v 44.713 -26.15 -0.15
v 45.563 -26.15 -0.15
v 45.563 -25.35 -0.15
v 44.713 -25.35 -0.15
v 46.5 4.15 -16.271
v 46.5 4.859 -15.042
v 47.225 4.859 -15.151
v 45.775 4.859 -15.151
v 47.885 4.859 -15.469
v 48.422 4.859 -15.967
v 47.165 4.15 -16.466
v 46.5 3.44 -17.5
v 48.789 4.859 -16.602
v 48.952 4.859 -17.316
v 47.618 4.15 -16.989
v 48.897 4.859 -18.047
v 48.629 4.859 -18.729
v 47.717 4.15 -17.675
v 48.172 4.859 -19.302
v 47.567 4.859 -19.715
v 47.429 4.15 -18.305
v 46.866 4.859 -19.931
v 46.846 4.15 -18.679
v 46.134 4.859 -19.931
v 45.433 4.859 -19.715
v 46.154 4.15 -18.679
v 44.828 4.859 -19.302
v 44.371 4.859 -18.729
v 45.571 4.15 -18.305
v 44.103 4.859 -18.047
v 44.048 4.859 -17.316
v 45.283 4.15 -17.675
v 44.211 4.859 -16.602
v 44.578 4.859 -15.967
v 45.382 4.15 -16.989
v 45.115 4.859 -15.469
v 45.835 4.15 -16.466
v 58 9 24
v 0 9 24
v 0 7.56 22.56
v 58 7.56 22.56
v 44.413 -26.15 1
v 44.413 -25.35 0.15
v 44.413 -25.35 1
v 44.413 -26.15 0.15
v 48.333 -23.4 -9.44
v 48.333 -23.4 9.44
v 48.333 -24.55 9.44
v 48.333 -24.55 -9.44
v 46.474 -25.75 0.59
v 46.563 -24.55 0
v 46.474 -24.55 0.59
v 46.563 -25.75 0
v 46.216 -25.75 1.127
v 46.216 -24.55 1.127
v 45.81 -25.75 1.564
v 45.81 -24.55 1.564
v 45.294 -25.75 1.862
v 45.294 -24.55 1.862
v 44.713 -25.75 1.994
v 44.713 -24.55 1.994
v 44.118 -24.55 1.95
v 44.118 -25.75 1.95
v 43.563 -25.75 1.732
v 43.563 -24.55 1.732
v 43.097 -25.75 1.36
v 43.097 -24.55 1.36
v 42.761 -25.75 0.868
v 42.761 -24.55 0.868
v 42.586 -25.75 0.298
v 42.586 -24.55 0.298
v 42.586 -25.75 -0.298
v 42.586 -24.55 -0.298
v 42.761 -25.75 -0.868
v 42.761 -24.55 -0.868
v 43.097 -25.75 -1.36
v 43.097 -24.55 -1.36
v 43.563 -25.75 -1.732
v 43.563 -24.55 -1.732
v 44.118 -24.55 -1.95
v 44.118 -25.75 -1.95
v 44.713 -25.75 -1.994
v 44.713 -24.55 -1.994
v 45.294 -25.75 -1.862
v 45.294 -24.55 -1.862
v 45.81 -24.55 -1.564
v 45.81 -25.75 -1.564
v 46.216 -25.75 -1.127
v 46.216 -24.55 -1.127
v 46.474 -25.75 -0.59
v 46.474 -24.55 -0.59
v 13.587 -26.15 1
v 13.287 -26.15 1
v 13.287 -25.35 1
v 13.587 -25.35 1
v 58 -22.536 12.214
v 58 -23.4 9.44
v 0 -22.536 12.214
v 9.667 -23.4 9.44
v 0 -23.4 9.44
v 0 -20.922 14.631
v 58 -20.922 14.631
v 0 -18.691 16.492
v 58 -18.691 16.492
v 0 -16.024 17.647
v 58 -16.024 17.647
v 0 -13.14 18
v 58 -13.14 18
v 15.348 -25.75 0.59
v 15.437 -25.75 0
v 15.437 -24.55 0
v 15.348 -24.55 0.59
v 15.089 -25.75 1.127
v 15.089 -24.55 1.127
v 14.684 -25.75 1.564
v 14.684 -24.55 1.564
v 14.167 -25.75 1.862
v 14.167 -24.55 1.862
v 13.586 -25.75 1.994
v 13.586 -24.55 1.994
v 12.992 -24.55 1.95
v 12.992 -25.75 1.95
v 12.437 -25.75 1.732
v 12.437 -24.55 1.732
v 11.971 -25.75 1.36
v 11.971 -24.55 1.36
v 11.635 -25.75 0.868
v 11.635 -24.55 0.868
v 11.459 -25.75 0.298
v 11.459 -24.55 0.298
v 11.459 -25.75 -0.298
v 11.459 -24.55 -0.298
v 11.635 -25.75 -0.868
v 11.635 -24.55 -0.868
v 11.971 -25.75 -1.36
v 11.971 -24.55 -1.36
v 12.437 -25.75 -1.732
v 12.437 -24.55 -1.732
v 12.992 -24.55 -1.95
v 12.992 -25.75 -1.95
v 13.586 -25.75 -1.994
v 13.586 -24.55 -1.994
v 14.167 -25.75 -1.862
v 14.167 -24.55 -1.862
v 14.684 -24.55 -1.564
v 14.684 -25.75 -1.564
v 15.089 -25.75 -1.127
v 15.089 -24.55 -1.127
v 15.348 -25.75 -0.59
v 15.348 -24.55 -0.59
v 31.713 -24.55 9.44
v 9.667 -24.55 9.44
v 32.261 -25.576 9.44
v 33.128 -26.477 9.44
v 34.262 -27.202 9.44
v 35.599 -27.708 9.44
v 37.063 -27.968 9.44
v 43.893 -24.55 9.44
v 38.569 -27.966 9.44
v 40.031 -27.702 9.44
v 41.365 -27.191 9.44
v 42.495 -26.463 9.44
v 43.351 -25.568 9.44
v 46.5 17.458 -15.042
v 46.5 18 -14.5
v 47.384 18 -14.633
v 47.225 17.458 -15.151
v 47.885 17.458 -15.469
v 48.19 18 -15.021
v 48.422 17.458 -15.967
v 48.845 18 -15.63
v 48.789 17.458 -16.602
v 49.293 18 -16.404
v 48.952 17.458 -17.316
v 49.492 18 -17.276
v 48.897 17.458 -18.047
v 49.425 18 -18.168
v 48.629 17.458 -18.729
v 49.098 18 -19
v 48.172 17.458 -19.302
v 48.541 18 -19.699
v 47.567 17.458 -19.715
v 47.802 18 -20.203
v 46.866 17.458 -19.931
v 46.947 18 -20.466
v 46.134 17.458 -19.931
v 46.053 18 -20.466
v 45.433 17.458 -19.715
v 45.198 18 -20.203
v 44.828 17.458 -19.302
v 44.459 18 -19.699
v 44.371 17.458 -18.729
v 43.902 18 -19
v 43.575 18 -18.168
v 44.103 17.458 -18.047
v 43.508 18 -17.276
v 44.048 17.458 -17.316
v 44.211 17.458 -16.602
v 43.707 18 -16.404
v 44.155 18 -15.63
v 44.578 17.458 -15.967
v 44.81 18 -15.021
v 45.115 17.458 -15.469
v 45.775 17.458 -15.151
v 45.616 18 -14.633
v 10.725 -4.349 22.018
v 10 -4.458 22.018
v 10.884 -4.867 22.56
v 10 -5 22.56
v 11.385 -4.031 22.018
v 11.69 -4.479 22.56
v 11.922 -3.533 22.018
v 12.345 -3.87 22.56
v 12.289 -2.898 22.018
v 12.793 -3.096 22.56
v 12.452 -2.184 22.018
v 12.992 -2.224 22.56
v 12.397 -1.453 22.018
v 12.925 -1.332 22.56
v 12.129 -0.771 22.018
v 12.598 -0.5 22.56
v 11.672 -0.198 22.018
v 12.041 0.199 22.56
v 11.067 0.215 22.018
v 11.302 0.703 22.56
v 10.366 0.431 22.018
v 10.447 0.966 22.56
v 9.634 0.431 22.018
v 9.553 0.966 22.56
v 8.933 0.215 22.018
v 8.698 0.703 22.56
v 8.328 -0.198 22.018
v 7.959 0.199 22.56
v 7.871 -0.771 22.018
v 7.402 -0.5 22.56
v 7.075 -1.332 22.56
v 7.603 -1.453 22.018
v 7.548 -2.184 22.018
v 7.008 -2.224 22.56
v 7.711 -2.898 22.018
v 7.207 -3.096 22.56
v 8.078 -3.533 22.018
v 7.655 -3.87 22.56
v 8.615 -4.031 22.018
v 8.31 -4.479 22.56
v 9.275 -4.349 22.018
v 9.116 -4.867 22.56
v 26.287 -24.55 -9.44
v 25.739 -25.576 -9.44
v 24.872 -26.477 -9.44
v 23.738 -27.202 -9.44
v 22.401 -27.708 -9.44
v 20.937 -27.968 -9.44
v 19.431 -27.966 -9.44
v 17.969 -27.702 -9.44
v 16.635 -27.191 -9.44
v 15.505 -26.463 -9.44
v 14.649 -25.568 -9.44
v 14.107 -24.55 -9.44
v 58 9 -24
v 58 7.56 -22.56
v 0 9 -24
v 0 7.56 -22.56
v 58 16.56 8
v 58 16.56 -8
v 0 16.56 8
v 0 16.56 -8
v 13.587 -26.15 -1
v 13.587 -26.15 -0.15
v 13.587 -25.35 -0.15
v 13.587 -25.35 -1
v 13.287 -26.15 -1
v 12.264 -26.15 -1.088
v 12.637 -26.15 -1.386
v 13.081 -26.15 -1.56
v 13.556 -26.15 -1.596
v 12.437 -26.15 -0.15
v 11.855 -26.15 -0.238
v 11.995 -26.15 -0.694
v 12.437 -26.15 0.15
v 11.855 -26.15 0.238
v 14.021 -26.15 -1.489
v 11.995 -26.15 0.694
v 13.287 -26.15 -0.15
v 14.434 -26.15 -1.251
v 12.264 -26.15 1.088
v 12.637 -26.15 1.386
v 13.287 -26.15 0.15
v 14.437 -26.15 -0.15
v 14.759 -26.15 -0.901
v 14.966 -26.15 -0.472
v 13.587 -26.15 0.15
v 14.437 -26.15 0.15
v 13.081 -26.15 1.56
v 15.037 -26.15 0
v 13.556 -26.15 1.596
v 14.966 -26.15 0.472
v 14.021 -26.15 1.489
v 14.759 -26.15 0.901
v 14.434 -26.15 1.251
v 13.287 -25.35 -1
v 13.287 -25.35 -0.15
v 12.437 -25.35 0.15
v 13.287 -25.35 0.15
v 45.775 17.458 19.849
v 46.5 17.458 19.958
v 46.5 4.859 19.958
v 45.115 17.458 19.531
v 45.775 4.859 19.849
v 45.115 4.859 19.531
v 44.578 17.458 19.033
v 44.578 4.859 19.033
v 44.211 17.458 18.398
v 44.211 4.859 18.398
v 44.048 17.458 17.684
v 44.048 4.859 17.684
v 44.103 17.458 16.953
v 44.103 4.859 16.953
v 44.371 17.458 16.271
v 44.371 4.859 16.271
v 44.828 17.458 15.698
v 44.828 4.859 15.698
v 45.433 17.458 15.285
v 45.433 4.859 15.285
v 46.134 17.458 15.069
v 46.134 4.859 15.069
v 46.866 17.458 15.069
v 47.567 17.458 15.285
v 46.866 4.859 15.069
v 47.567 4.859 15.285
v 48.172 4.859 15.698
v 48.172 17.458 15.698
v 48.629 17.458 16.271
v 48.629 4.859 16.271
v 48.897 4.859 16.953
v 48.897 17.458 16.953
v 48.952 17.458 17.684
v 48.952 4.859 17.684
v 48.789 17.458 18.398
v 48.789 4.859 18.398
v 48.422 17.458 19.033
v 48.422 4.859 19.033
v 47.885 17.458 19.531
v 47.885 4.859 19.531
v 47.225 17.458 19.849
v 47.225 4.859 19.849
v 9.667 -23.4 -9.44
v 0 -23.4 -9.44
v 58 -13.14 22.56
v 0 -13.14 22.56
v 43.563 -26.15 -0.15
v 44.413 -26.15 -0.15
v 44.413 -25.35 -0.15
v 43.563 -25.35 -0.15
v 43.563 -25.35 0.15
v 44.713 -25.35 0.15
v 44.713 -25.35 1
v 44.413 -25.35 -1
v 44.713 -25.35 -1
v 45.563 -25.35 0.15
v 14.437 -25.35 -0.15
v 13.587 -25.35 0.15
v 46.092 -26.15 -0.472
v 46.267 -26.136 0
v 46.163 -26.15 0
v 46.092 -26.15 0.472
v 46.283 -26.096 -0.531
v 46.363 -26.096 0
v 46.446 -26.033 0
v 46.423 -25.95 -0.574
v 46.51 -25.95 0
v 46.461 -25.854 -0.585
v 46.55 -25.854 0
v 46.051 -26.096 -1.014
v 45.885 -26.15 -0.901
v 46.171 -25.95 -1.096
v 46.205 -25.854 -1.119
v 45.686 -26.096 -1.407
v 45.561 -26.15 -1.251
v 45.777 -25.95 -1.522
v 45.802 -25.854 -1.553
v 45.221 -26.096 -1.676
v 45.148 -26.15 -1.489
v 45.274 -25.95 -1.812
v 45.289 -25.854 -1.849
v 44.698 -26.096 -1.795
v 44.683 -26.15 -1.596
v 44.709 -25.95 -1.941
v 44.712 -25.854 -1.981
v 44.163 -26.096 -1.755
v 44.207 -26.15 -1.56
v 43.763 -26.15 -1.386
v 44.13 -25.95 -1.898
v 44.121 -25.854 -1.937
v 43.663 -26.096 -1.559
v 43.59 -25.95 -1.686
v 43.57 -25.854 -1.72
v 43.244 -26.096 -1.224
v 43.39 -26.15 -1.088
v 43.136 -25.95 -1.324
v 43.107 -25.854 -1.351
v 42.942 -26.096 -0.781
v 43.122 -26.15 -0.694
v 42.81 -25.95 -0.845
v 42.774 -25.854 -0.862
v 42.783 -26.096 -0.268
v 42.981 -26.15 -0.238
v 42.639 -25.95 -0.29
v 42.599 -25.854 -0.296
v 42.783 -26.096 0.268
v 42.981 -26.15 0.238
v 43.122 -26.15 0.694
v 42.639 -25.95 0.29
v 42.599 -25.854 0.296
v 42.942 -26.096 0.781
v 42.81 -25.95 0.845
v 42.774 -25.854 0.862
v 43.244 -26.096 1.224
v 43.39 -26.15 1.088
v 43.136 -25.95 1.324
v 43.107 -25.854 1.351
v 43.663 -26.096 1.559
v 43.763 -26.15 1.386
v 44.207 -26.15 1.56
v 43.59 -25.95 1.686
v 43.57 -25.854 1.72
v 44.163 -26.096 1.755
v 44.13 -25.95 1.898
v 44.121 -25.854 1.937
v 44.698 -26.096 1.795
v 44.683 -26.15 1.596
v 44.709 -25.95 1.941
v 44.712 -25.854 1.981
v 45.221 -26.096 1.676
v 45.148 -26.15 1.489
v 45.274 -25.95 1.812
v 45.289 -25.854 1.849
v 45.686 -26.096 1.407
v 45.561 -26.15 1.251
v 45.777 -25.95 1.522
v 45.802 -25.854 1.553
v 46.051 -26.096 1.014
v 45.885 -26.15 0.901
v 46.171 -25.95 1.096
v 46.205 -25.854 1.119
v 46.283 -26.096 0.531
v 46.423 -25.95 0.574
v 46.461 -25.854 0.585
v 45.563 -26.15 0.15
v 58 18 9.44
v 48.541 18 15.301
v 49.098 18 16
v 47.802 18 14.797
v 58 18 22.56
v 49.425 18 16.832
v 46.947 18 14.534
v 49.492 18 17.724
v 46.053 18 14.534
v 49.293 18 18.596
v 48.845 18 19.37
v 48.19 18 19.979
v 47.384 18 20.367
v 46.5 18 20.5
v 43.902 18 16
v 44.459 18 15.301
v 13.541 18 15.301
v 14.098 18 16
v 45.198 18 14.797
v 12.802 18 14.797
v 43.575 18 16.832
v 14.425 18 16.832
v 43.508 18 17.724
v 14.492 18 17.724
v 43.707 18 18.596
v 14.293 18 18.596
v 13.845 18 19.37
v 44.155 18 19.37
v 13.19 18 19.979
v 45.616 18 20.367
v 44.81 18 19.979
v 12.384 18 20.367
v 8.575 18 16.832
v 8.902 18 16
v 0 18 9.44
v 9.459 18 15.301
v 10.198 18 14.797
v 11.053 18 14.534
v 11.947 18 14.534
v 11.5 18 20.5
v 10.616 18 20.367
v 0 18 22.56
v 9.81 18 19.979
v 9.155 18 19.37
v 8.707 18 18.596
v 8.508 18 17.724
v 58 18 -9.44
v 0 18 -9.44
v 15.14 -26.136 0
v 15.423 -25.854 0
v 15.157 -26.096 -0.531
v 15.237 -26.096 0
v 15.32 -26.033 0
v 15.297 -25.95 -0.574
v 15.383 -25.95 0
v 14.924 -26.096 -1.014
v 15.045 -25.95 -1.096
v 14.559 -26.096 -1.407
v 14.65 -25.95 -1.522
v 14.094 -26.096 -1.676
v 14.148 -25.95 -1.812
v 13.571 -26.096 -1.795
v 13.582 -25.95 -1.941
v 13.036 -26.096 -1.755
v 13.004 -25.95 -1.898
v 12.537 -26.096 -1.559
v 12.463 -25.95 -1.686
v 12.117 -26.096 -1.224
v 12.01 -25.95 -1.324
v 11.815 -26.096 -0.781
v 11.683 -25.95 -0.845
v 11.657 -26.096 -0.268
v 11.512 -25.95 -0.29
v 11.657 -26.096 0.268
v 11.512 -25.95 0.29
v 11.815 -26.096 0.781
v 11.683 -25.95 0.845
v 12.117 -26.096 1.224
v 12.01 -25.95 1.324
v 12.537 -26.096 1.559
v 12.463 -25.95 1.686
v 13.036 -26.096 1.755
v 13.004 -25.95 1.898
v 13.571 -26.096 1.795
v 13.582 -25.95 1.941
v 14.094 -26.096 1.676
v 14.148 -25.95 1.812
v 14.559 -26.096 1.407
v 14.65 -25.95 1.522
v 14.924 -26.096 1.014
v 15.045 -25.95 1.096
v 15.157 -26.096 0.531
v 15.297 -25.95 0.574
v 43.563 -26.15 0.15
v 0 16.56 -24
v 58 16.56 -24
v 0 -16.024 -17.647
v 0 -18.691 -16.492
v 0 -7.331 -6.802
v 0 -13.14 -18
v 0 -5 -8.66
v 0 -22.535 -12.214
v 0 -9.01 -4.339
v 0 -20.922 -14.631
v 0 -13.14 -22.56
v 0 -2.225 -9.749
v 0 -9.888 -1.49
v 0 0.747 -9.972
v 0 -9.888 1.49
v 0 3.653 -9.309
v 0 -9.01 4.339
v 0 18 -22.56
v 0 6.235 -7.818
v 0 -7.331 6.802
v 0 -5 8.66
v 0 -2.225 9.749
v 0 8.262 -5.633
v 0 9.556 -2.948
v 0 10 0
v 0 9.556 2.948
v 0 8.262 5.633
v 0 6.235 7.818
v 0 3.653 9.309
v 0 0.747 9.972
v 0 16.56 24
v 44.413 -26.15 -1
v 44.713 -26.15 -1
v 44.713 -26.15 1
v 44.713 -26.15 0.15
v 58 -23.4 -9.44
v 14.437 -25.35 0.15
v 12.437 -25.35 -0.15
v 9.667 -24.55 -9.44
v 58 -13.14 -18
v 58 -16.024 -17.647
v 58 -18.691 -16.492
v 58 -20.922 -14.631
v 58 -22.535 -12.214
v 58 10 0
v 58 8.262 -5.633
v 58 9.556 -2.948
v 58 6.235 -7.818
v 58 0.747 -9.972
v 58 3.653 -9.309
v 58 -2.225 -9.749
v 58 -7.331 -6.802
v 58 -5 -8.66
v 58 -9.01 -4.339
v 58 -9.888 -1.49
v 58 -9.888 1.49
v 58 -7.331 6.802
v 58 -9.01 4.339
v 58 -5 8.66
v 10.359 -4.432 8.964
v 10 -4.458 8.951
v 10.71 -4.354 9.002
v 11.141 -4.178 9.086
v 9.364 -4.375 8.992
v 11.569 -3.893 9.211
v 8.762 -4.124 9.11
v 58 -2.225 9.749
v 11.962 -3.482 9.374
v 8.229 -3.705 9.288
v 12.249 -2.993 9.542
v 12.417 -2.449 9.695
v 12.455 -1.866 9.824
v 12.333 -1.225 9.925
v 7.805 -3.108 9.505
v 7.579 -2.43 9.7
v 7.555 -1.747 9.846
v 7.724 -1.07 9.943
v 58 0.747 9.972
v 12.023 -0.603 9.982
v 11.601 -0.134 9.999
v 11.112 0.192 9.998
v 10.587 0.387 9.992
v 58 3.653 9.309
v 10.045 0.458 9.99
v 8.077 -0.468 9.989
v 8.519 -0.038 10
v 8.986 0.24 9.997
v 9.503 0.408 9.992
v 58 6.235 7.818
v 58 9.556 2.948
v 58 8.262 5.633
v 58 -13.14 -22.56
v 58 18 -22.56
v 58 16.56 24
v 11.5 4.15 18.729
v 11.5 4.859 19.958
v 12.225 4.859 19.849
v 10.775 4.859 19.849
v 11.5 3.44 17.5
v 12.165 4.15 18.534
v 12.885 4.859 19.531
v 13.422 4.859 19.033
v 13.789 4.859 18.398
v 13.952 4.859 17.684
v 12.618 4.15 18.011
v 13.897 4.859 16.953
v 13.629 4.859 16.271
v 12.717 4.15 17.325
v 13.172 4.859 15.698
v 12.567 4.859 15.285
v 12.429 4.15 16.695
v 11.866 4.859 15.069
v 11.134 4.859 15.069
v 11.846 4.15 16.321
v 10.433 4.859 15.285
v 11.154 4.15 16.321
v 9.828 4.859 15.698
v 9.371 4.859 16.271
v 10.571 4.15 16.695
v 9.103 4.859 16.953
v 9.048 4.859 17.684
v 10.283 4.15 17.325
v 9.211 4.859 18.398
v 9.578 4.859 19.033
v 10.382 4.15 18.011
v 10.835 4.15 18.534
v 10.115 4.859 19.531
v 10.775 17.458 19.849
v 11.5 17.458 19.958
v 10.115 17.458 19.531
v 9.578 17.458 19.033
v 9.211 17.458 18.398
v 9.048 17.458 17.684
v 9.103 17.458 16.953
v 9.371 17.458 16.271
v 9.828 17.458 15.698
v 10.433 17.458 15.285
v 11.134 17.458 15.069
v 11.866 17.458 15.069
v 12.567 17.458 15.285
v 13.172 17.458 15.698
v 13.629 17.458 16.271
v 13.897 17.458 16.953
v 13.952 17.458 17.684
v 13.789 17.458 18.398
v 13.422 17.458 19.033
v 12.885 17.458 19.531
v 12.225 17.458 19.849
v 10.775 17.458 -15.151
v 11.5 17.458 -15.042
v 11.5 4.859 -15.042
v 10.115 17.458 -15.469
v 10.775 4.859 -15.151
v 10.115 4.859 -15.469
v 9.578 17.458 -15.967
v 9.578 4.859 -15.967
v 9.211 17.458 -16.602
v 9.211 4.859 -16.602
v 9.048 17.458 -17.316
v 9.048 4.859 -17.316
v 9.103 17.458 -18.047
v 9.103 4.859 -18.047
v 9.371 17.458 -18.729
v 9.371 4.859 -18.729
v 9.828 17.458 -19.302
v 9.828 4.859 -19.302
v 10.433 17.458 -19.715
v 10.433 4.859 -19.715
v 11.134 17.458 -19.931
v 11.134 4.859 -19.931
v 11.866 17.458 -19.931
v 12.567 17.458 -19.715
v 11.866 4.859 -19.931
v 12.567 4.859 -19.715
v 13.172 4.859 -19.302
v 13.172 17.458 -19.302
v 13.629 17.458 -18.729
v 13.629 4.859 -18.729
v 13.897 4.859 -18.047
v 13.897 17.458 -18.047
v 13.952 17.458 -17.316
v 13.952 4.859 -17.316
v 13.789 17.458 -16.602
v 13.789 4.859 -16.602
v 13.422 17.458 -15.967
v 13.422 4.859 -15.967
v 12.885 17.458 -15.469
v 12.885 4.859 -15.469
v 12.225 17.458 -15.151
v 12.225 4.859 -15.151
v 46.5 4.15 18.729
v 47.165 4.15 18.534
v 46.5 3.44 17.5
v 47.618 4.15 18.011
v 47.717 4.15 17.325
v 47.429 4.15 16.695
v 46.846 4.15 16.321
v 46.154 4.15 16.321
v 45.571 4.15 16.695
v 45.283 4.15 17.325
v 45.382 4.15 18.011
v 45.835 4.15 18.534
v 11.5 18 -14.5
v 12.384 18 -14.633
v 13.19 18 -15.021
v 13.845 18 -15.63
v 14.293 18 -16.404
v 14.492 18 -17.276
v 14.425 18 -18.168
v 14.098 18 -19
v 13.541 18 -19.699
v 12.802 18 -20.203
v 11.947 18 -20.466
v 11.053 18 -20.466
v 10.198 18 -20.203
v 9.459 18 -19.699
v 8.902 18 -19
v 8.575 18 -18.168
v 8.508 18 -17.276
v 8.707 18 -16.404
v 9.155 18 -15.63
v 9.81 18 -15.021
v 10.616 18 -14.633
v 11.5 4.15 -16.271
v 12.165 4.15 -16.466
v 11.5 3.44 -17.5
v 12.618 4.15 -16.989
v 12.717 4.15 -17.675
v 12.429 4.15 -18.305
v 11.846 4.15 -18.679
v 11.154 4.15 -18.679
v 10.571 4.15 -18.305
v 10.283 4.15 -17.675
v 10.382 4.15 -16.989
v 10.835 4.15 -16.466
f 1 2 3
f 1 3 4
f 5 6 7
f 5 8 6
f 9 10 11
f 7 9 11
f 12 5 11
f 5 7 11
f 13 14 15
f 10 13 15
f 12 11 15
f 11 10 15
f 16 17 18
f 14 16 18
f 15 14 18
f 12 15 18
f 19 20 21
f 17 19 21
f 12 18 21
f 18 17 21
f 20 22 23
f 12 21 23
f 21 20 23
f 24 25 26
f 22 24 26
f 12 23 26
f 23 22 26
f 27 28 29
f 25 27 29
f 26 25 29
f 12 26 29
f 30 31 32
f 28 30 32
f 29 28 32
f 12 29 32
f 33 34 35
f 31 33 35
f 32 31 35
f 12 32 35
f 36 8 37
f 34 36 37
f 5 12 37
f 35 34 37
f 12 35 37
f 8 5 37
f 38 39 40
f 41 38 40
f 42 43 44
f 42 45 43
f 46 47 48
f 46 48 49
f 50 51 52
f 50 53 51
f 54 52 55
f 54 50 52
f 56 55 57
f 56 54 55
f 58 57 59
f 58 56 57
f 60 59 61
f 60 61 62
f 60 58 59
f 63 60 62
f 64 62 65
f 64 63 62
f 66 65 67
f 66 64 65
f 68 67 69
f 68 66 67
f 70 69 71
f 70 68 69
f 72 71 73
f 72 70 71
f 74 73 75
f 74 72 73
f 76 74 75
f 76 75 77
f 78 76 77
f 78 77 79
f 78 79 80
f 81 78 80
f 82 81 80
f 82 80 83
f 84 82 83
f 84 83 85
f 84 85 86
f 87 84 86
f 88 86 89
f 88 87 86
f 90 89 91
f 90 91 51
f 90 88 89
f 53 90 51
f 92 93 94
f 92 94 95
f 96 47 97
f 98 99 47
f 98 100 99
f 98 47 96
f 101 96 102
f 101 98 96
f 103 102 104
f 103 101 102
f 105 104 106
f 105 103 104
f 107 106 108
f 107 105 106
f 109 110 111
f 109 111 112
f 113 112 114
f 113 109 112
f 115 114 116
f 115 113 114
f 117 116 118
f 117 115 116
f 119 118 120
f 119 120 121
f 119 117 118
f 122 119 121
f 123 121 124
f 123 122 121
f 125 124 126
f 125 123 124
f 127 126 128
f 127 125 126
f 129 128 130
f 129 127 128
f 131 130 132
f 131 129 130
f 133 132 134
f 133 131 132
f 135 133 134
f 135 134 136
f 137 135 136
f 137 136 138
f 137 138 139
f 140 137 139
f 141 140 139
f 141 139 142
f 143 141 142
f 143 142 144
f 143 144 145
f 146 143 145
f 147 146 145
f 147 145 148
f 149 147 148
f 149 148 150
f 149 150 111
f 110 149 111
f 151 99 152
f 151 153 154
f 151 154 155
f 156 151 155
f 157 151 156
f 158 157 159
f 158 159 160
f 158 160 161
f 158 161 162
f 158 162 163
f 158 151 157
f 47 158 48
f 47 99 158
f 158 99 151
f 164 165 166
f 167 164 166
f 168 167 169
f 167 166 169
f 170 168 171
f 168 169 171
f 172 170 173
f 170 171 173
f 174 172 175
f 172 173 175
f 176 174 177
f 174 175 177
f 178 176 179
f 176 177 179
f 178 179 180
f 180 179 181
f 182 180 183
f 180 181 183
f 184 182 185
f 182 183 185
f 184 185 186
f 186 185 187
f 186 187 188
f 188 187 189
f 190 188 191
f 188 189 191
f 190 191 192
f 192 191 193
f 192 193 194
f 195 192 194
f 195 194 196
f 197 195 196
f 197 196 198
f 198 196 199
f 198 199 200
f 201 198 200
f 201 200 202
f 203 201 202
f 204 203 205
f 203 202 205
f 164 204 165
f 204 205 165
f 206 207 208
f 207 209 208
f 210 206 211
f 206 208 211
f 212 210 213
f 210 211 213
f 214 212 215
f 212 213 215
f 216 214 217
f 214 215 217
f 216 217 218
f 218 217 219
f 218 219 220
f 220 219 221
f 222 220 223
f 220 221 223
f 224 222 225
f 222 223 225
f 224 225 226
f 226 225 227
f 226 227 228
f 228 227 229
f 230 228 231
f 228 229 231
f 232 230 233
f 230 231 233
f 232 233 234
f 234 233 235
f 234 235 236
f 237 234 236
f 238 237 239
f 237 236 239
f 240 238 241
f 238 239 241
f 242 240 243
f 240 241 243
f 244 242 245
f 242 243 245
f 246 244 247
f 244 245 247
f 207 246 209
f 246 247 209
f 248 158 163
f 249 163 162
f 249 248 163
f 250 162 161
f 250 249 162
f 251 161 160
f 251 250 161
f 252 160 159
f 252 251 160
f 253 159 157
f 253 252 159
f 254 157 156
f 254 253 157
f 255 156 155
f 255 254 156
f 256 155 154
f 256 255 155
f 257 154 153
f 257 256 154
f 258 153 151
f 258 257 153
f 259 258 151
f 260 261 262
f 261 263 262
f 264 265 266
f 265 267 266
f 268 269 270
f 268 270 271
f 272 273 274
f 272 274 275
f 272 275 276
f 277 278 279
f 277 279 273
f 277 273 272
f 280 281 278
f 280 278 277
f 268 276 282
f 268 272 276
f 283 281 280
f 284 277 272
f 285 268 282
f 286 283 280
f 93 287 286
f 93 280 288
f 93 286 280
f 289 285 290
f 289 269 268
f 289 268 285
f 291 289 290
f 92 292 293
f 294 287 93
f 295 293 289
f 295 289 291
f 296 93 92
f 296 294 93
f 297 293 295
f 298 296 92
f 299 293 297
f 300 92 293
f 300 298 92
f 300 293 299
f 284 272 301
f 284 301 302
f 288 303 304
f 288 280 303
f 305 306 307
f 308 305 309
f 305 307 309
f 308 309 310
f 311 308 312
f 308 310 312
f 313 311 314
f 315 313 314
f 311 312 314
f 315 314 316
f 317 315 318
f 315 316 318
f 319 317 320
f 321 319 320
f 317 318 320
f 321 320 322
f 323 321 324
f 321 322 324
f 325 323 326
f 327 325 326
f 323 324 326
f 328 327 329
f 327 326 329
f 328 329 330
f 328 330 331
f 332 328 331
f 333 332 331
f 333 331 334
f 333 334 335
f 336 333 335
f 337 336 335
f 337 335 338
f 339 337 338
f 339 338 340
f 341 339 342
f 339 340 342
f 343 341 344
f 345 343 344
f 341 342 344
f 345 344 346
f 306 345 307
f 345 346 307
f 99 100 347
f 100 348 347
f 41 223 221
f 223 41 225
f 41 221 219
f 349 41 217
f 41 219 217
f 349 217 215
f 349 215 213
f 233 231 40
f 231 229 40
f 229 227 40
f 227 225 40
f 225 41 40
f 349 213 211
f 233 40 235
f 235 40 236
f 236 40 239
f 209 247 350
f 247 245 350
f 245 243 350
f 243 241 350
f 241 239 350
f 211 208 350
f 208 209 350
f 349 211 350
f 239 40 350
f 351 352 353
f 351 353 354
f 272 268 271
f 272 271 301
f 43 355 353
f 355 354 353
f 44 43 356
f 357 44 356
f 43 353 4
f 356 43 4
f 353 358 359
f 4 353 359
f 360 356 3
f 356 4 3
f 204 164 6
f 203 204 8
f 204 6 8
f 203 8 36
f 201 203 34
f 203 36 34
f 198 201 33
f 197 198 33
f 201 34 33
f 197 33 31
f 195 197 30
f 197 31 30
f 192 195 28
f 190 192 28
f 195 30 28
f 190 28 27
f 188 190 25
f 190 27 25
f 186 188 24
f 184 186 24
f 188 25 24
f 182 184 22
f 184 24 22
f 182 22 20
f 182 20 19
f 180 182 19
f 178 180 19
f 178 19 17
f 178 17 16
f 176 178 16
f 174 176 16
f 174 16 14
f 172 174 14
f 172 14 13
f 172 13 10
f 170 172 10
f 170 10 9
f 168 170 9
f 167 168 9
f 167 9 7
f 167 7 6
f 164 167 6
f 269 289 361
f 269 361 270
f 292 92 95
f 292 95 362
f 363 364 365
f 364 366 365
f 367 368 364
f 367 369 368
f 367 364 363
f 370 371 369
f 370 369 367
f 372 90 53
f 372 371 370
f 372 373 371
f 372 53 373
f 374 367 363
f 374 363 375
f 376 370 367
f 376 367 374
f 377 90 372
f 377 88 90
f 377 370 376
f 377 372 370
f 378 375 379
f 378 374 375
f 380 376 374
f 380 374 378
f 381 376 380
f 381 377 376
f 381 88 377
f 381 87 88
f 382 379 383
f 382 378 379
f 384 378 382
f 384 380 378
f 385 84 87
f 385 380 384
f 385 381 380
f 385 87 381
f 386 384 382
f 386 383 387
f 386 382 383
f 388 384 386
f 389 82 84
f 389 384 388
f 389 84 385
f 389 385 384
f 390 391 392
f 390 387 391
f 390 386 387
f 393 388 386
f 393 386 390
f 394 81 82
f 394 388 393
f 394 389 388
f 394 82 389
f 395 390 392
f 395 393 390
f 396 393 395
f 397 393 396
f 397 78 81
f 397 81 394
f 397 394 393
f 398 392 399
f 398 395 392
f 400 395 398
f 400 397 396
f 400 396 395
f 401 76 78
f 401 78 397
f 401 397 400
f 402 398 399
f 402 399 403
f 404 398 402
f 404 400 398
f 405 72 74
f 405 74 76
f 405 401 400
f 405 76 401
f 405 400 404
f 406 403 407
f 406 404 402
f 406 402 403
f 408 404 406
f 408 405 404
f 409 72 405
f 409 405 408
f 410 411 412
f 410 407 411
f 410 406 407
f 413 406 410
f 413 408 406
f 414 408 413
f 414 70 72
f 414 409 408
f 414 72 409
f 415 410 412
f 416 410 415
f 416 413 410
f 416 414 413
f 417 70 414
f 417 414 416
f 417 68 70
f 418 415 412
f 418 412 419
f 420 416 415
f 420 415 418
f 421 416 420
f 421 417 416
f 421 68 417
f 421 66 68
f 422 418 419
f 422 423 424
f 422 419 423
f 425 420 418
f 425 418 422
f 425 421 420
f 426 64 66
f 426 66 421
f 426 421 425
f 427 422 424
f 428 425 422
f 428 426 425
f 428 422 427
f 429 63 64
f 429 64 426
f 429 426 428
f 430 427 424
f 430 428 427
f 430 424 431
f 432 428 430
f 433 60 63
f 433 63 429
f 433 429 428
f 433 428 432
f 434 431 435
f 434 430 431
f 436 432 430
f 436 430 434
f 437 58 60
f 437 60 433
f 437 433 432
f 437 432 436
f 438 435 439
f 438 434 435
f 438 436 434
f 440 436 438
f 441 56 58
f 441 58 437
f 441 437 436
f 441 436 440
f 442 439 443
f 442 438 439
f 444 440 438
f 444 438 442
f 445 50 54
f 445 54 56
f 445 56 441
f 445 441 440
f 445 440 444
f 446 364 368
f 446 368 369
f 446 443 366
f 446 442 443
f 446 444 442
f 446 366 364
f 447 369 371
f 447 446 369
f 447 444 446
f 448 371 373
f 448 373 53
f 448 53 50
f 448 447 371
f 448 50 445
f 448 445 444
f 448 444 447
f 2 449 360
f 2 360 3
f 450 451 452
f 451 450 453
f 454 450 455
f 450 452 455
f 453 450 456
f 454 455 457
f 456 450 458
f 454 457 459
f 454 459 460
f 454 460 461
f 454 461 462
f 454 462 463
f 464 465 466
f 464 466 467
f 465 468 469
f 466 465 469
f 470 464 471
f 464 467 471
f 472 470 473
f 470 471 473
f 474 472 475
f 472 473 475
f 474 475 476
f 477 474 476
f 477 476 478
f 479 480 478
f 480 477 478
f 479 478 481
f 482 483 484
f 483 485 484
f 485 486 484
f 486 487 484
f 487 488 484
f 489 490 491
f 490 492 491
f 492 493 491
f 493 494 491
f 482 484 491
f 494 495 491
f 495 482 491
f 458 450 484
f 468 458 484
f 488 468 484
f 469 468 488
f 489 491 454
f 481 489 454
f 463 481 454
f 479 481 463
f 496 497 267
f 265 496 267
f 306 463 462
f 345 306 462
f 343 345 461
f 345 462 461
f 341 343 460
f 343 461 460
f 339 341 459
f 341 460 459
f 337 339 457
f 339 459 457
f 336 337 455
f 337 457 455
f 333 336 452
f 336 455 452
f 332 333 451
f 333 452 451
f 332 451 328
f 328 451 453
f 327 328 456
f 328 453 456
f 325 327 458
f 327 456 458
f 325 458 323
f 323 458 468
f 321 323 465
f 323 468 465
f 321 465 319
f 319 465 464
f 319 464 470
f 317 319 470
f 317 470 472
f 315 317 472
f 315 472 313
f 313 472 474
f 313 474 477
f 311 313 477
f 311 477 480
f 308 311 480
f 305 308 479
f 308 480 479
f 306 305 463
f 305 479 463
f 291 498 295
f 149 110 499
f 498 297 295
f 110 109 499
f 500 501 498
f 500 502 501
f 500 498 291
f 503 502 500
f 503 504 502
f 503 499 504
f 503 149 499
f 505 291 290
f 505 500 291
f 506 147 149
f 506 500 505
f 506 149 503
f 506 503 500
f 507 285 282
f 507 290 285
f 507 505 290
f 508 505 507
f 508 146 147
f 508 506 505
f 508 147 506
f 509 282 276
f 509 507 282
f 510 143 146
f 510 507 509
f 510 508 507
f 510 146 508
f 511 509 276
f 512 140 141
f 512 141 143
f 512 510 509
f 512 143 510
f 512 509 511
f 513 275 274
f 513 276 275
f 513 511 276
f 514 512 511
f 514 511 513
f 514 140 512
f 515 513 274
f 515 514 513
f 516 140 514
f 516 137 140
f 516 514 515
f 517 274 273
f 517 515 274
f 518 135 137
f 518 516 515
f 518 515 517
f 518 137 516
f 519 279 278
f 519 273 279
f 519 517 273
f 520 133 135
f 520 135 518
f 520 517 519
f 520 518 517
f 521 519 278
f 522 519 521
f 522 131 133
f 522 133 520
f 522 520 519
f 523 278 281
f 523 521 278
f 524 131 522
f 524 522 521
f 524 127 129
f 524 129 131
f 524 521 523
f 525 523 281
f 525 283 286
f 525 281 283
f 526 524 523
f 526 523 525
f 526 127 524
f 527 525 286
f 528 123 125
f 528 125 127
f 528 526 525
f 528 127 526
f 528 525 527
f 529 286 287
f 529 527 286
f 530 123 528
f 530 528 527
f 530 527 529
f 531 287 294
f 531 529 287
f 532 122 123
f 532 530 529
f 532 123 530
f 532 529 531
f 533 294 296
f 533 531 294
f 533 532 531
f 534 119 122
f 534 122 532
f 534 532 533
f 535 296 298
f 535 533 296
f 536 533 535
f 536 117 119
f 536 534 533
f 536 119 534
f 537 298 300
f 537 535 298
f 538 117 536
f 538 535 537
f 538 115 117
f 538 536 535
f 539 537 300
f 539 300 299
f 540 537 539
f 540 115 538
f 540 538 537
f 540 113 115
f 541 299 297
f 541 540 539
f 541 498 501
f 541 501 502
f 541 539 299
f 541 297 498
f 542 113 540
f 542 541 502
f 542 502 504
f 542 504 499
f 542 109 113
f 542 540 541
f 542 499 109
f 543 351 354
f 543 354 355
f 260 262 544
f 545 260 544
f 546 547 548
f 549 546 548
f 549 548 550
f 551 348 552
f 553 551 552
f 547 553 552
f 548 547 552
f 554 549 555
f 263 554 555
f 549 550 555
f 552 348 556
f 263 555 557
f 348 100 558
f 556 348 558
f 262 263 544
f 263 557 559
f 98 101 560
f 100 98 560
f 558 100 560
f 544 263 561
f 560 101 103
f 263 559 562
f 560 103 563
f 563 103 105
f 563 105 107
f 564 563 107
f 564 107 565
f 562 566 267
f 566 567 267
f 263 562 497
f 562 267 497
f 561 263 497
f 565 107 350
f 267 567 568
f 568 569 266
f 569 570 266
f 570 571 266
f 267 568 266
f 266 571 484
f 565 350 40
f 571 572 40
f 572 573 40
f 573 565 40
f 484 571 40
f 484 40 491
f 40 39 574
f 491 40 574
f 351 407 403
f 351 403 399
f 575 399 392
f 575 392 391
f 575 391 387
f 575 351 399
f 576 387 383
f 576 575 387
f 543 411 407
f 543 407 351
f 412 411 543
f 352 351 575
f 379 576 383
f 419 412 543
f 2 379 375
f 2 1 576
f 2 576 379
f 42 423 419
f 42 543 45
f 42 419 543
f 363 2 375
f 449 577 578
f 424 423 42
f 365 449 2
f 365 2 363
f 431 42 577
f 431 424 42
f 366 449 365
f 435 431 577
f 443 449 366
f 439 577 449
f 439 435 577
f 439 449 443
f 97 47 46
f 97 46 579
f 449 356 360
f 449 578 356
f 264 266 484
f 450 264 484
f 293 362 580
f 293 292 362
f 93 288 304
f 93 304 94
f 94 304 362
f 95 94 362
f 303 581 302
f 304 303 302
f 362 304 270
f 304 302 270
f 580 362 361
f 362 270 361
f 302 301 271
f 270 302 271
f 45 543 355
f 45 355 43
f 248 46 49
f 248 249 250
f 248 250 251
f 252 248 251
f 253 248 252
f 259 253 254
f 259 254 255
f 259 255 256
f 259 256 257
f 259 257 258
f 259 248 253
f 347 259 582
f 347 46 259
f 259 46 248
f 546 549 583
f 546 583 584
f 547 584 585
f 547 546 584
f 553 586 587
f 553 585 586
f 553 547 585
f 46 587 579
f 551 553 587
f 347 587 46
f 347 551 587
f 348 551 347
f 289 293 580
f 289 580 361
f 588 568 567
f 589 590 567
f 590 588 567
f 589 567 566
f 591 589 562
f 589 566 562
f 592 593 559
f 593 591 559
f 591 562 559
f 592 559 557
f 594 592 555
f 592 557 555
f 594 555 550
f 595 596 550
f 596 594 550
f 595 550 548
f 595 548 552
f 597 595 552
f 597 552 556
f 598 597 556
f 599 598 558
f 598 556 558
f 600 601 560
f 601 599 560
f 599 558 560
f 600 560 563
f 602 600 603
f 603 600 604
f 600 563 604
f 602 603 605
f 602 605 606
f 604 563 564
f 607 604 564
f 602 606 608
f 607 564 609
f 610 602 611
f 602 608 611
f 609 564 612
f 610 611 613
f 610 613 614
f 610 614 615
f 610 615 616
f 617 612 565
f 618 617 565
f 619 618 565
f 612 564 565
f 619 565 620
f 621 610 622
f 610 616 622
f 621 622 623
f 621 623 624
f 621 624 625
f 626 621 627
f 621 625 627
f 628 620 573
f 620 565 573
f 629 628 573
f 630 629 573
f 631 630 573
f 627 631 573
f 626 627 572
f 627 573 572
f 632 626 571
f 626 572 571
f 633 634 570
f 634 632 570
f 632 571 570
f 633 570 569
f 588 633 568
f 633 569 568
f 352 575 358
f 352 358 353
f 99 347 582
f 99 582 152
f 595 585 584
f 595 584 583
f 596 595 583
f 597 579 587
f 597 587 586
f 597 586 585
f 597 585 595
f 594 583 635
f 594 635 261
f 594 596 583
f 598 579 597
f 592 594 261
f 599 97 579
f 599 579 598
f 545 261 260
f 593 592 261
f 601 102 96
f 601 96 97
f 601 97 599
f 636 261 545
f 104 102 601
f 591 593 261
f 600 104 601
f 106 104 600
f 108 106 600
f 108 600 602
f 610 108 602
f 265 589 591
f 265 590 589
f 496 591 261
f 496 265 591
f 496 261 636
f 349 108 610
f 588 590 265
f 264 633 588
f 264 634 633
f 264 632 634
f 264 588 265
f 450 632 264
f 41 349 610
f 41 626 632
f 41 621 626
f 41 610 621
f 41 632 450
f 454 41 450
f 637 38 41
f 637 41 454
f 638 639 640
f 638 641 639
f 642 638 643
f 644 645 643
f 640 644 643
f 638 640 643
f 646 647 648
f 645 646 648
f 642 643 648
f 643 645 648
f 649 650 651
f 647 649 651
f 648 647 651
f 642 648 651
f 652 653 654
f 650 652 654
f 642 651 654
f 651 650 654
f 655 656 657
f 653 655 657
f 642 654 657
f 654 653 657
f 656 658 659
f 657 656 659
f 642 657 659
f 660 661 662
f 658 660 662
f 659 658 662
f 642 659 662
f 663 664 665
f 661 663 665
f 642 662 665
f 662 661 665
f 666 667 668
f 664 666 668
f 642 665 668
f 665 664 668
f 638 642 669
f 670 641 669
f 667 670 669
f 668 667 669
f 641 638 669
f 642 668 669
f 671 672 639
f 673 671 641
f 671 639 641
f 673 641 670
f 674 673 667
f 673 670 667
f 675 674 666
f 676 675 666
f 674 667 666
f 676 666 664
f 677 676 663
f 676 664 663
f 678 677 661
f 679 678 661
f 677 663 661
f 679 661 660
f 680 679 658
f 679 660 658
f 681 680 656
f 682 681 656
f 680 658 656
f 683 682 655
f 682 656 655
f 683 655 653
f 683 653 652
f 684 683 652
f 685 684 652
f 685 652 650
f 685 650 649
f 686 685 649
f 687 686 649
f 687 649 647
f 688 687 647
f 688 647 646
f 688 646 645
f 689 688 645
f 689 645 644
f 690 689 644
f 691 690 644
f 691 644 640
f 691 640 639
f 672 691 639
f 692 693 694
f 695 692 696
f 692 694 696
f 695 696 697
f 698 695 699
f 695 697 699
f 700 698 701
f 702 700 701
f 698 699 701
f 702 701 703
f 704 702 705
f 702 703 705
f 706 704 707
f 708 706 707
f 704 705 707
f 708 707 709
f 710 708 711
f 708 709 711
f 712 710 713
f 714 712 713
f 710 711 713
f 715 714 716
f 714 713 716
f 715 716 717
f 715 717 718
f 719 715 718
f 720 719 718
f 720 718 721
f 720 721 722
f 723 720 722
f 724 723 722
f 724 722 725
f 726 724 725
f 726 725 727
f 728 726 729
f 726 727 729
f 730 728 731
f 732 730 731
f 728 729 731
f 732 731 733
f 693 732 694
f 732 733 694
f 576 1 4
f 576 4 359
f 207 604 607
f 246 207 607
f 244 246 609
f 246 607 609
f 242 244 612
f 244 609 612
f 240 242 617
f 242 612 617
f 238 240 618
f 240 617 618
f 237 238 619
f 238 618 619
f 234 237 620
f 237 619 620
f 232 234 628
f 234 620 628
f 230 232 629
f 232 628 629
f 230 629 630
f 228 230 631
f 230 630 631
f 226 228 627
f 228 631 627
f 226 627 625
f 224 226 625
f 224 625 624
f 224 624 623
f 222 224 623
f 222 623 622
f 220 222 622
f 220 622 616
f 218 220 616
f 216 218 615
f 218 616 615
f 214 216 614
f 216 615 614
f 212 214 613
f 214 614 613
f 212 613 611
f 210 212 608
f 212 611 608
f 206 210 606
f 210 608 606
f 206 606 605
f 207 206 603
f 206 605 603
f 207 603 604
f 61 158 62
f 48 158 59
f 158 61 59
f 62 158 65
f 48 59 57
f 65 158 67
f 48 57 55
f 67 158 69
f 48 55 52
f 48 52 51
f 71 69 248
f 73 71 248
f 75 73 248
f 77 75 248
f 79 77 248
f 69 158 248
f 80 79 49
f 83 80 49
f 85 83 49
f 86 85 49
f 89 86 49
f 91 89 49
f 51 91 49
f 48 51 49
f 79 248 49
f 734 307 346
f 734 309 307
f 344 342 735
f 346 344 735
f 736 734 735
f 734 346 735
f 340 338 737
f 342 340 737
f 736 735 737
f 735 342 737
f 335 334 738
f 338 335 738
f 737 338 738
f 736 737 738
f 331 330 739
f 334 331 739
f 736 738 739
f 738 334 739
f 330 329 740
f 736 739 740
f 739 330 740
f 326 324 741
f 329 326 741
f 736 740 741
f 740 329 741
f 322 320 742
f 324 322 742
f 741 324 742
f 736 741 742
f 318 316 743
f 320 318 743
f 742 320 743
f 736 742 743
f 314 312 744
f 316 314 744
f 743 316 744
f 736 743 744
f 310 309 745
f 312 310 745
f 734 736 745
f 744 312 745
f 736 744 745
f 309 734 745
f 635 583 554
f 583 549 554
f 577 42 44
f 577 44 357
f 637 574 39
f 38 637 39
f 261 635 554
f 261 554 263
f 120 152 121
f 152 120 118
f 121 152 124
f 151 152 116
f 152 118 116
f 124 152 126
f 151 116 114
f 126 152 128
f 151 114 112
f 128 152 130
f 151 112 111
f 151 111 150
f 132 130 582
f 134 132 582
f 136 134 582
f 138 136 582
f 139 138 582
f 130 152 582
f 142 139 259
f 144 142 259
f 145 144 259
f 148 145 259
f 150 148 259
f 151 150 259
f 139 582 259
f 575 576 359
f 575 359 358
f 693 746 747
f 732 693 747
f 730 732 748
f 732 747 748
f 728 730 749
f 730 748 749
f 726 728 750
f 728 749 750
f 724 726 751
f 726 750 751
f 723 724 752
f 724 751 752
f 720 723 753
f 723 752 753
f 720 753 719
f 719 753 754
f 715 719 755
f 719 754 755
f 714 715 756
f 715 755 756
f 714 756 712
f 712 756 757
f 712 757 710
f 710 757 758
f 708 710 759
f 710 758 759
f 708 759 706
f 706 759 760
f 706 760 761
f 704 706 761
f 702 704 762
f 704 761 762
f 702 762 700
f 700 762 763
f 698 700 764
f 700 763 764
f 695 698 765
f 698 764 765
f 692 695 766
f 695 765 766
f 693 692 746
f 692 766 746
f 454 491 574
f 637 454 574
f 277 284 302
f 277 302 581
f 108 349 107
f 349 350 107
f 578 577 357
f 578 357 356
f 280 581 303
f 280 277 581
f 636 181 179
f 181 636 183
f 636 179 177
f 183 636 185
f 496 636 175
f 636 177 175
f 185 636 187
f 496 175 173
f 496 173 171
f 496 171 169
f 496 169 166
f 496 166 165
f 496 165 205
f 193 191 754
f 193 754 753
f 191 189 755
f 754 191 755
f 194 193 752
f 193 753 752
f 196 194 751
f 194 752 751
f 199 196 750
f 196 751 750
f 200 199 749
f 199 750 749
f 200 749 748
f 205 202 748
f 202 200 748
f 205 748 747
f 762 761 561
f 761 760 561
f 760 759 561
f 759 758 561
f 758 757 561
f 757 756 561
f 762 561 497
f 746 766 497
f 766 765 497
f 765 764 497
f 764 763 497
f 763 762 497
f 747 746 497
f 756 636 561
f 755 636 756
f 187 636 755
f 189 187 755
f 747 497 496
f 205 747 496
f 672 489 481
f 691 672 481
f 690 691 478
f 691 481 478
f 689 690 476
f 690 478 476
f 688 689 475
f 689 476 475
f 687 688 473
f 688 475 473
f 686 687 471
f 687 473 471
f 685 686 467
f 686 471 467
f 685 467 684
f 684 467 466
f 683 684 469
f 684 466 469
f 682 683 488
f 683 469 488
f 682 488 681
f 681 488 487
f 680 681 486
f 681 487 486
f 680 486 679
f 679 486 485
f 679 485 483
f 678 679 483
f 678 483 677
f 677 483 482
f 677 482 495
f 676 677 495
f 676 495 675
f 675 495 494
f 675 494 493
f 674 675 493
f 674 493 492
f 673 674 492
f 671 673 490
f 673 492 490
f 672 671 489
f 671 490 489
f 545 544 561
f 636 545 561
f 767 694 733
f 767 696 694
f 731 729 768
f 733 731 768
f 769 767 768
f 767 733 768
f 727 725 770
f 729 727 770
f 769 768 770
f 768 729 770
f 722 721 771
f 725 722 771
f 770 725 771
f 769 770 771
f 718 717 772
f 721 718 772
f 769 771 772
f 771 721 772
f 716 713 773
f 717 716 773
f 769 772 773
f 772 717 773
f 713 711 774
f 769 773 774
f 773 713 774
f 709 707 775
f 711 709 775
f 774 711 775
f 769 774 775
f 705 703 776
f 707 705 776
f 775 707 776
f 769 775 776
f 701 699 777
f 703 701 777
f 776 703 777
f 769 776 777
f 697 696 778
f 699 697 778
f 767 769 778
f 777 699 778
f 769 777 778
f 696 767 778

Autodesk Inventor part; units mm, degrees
sketch "Sketch_1" plane through (0, 0, 0) normal (1, 0, 0) x (0, 1, 0)
  line L0 (16.56, 24) -> (9, 24)
  line L1 (9, 24) -> (7.56, 22.56)
  line L2 (7.56, 22.56) -> (-13.14, 22.56)
  line L3 (-13.14, 22.56) -> (-13.14, 18)
  arc A0 (-13.14, 18) -> (-23.4, 9.44) centre (-13.3579, 7.8323) ccw
  line L4 (-23.4, 9.44) -> (-23.4, -9.44)
  arc A1 (-23.4, -9.44) -> (-13.14, -18) centre (-13.3579, -7.8323) ccw
  line L5 (-13.14, -18) -> (-13.14, -22.56)
  line L6 (-13.14, -22.56) -> (7.56, -22.56)
  line L7 (7.56, -22.56) -> (9, -24)
  line L8 (9, -24) -> (16.56, -24)
  line L9 (16.56, -24) -> (18, -22.56)
  line L10 (18, -22.56) -> (18, -9.44)
  line L11 (18, -9.44) -> (16.56, -8)
  line L12 (16.56, -8) -> (16.56, 8)
  line L13 (16.56, 8) -> (18, 9.44)
  line L14 (18, 9.44) -> (18, 22.56)
  line L15 (18, 22.56) -> (16.56, 24)
  circle A2 centre (0, 0) radius 10
extrude "Extrusion1" add sketch "Sketch_1" along normal blind 58
sketch "Sketch_2" plane through (29, 0, 0) normal (0.682, 0, 0.7314) x (0.7314, 0, -0.682)
  line L0 (-29, -24.55) -> (-4.4539, -24.55)
  arc A0 (-4.4539, -24.55) -> (4.4539, -24.55) centre (0, -23.4) ccw
  line L1 (4.4539, -24.55) -> (29, -24.55)
  line L2 (29, -24.55) -> (29, -23.4)
  line L3 (29, -23.4) -> (-29, -23.4)
  line L4 (-29, -23.4) -> (-29, -24.55)
extrude "Extrusion2" add sketch "Sketch_2" along normal mid plane 58
sketch "Sketch_3" plane through (0, -23.4, 0) normal (0, 1, 0) x (1, 0, 0)
  line L0 (-29, -58) -> (87, -58)
  line L1 (87, -58) -> (87, 58)
  line L2 (87, 58) -> (-29, 58)
  line L3 (-29, 58) -> (-29, -58)
  line L4 (9.6667, -9.44) -> (48.3333, -9.44)
  line L5 (48.3333, -9.44) -> (48.3333, 9.44)
  line L6 (48.3333, 9.44) -> (9.6667, 9.44)
  line L7 (9.6667, 9.44) -> (9.6667, -9.44)
extrude "Extrusion3" cut sketch "Sketch_3" against normal blind 4.6
sketch "Sketch_4" plane through (0, 0, 0) normal (0, 0, 1) x (1, 0, 0)
  line L0 (13.4367, -26.15) -> (13.4367, -24.55)
  line L1 (13.4367, -24.55) -> (15.4367, -24.55)
  line L2 (15.4367, -24.55) -> (15.4367, -25.75)
  arc A0 (15.0367, -26.15) -> (15.4367, -25.75) centre (15.0367, -25.75) ccw
  line L3 (15.0367, -26.15) -> (13.4367, -26.15)
  line L4 (13.4367, -26.15) -> (13.4367, -24.55)
revolve "Revolution1" add sketch "Sketch_4" angle 360 about axis through (13.4367, -26.15, 0) along (0, -1, 0)
sketch "Sketch_5" plane through (0, 0, 0) normal (0, 0, 1) x (1, 0, 0)
  line L0 (44.5633, -26.15) -> (44.5633, -24.55)
  line L1 (44.5633, -24.55) -> (46.5633, -24.55)
  line L2 (46.5633, -24.55) -> (46.5633, -25.75)
  arc A0 (46.1633, -26.15) -> (46.5633, -25.75) centre (46.1633, -25.75) ccw
  line L3 (46.1633, -26.15) -> (44.5633, -26.15)
  line L4 (44.5633, -26.15) -> (44.5633, -24.55)
revolve "Revolution2" add sketch "Sketch_5" angle 360 about axis through (44.5633, -26.15, 0) along (0, -1, 0)
sketch "Sketch_6" plane through (0, -26.15, 0) normal (0, 1, 0) x (1, 0, 0)
  line L0 (43.5633, 0.15) -> (43.5633, -0.15)
  line L1 (43.5633, -0.15) -> (44.4133, -0.15)
  line L2 (44.4133, -0.15) -> (44.4133, -1)
  line L3 (44.4133, -1) -> (44.7133, -1)
  line L4 (44.7133, -1) -> (44.7133, -0.15)
  line L5 (44.7133, -0.15) -> (45.5633, -0.15)
  line L6 (45.5633, -0.15) -> (45.5633, 0.15)
  line L7 (45.5633, 0.15) -> (44.7133, 0.15)
  line L8 (44.7133, 0.15) -> (44.7133, 1)
  line L9 (44.7133, 1) -> (44.4133, 1)
  line L10 (44.4133, 1) -> (44.4133, 0.15)
  line L11 (44.4133, 0.15) -> (43.5633, 0.15)
extrude "Extrusion4" cut sketch "Sketch_6" along normal blind 0.8
sketch "Sketch_7" plane through (0, -26.15, 0) normal (0, 1, 0) x (1, 0, 0)
  line L0 (12.4367, 0.15) -> (12.4367, -0.15)
  line L1 (12.4367, -0.15) -> (13.2867, -0.15)
  line L2 (13.2867, -0.15) -> (13.2867, -1)
  line L3 (13.2867, -1) -> (13.5867, -1)
  line L4 (13.5867, -1) -> (13.5867, -0.15)
  line L5 (13.5867, -0.15) -> (14.4367, -0.15)
  line L6 (14.4367, -0.15) -> (14.4367, 0.15)
  line L7 (14.4367, 0.15) -> (13.5867, 0.15)
  line L8 (13.5867, 0.15) -> (13.5867, 1)
  line L9 (13.5867, 1) -> (13.2867, 1)
  line L10 (13.2867, 1) -> (13.2867, 0.15)
  line L11 (13.2867, 0.15) -> (12.4367, 0.15)
extrude "Extrusion5" cut sketch "Sketch_7" along normal blind 0.8
sketch "Sketch8" plane through (0, -13.14, 22.56) normal (0, 0, 1) x (1, 0, 0)
  point P0 (10, 11.14)
hole "Hole1" at (10, -2, 22.56) direction (0, 0, -1) diameter 4.917 depth 14.1406 tip angle 120 countersink diameter 6 countersink angle 90 thread size "M6x1" class "6H" standard "ISO Metric profile"
sketch "Sketch9" plane through (0, 18, -9.44) normal (0, 1, 0) x (1, 0, 0)
  point P0 (11.5, 8.06)
hole "Hole2" at (11.5, 18, -17.5) direction (0, -1, 0) diameter 4.917 depth 13.1406 tip angle 120 countersink diameter 6 countersink angle 90 thread size "M6x1" class "6H" standard "ISO Metric profile"
pattern_linear "Rectangular Pattern1" count 2 spacing 35 along (1, 0, 0) count 2 spacing 35 along (0, 0, 1) of "Hole2"
ref_plane "bnt_nut_1_XY" through (0, 0, 0) normal (1, 0, 0) x (0, 0, -1)
ref_plane "bnt_nut_1_YZ" through (0, 0, 0) normal (0, 0, -1) x (0, 1, 0)
ref_plane "bnt_nut_1_ZX" through (0, 0, 0) normal (0, 1, 0) x (1, 0, 0)
properties part number "BNT 2010-2.6 Nut"
